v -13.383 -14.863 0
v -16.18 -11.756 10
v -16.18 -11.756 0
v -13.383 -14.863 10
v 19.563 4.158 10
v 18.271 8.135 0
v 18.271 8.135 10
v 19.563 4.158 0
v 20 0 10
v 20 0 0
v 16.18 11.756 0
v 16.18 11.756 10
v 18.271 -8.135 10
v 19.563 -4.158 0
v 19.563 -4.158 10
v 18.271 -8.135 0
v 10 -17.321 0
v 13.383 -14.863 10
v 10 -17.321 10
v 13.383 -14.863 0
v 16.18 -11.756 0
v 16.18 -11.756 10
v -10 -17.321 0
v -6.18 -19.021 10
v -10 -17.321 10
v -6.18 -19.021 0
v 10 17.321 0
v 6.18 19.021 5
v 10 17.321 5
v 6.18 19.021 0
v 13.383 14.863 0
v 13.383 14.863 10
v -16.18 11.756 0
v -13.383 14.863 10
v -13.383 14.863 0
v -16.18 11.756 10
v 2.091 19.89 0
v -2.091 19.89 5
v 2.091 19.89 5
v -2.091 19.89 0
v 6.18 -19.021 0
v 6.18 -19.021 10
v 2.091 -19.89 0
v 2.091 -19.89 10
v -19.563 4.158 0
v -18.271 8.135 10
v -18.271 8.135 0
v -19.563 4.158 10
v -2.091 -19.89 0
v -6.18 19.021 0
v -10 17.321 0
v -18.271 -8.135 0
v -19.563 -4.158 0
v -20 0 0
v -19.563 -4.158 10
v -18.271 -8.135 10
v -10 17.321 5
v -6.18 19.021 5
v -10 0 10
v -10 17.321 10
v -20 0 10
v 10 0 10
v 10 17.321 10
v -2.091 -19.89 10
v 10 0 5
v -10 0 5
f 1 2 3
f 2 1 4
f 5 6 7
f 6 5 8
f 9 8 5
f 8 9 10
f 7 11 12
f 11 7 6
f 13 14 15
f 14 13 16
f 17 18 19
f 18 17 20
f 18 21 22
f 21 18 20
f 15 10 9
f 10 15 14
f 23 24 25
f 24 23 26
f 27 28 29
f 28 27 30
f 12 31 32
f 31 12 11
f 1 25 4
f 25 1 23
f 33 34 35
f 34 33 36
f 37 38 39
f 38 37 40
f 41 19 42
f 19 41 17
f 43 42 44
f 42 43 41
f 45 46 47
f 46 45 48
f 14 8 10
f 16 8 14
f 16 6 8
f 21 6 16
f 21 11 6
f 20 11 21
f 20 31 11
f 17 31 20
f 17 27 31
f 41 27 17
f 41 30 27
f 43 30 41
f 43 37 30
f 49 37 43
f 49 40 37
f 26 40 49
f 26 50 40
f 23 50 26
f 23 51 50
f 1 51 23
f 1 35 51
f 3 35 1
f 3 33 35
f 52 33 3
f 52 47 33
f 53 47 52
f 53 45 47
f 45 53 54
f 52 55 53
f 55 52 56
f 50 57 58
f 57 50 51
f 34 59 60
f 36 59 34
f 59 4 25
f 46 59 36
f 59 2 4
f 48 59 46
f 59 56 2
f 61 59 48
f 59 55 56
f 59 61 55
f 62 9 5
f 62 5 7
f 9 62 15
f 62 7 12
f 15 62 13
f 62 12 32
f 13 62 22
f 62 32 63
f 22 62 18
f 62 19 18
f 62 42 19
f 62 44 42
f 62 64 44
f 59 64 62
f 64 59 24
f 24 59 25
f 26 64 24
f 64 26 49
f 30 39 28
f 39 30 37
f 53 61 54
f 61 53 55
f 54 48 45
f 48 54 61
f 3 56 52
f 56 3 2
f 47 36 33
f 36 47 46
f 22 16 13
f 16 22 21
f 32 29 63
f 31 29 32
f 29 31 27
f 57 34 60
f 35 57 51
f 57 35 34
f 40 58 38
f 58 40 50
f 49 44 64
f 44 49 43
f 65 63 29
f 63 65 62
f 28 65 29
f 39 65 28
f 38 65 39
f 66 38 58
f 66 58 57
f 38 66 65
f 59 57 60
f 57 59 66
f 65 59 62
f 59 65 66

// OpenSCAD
irobot_height = 10;
irobot_radius = 20;
irobot_back_space_width = 20;
irobot_back_space_depth = 5;


module irobot(){
    difference(){

    //The main body
    cylinder(h = irobot_height, r = irobot_radius);
    

    //The space inside
    translate([-irobot_back_space_width/2, 0, irobot_height-irobot_back_space_depth])  
	// difference(){
	
    cube([irobot_back_space_width, irobot_radius*2, irobot_back_space_depth]);
}
}

irobot();
